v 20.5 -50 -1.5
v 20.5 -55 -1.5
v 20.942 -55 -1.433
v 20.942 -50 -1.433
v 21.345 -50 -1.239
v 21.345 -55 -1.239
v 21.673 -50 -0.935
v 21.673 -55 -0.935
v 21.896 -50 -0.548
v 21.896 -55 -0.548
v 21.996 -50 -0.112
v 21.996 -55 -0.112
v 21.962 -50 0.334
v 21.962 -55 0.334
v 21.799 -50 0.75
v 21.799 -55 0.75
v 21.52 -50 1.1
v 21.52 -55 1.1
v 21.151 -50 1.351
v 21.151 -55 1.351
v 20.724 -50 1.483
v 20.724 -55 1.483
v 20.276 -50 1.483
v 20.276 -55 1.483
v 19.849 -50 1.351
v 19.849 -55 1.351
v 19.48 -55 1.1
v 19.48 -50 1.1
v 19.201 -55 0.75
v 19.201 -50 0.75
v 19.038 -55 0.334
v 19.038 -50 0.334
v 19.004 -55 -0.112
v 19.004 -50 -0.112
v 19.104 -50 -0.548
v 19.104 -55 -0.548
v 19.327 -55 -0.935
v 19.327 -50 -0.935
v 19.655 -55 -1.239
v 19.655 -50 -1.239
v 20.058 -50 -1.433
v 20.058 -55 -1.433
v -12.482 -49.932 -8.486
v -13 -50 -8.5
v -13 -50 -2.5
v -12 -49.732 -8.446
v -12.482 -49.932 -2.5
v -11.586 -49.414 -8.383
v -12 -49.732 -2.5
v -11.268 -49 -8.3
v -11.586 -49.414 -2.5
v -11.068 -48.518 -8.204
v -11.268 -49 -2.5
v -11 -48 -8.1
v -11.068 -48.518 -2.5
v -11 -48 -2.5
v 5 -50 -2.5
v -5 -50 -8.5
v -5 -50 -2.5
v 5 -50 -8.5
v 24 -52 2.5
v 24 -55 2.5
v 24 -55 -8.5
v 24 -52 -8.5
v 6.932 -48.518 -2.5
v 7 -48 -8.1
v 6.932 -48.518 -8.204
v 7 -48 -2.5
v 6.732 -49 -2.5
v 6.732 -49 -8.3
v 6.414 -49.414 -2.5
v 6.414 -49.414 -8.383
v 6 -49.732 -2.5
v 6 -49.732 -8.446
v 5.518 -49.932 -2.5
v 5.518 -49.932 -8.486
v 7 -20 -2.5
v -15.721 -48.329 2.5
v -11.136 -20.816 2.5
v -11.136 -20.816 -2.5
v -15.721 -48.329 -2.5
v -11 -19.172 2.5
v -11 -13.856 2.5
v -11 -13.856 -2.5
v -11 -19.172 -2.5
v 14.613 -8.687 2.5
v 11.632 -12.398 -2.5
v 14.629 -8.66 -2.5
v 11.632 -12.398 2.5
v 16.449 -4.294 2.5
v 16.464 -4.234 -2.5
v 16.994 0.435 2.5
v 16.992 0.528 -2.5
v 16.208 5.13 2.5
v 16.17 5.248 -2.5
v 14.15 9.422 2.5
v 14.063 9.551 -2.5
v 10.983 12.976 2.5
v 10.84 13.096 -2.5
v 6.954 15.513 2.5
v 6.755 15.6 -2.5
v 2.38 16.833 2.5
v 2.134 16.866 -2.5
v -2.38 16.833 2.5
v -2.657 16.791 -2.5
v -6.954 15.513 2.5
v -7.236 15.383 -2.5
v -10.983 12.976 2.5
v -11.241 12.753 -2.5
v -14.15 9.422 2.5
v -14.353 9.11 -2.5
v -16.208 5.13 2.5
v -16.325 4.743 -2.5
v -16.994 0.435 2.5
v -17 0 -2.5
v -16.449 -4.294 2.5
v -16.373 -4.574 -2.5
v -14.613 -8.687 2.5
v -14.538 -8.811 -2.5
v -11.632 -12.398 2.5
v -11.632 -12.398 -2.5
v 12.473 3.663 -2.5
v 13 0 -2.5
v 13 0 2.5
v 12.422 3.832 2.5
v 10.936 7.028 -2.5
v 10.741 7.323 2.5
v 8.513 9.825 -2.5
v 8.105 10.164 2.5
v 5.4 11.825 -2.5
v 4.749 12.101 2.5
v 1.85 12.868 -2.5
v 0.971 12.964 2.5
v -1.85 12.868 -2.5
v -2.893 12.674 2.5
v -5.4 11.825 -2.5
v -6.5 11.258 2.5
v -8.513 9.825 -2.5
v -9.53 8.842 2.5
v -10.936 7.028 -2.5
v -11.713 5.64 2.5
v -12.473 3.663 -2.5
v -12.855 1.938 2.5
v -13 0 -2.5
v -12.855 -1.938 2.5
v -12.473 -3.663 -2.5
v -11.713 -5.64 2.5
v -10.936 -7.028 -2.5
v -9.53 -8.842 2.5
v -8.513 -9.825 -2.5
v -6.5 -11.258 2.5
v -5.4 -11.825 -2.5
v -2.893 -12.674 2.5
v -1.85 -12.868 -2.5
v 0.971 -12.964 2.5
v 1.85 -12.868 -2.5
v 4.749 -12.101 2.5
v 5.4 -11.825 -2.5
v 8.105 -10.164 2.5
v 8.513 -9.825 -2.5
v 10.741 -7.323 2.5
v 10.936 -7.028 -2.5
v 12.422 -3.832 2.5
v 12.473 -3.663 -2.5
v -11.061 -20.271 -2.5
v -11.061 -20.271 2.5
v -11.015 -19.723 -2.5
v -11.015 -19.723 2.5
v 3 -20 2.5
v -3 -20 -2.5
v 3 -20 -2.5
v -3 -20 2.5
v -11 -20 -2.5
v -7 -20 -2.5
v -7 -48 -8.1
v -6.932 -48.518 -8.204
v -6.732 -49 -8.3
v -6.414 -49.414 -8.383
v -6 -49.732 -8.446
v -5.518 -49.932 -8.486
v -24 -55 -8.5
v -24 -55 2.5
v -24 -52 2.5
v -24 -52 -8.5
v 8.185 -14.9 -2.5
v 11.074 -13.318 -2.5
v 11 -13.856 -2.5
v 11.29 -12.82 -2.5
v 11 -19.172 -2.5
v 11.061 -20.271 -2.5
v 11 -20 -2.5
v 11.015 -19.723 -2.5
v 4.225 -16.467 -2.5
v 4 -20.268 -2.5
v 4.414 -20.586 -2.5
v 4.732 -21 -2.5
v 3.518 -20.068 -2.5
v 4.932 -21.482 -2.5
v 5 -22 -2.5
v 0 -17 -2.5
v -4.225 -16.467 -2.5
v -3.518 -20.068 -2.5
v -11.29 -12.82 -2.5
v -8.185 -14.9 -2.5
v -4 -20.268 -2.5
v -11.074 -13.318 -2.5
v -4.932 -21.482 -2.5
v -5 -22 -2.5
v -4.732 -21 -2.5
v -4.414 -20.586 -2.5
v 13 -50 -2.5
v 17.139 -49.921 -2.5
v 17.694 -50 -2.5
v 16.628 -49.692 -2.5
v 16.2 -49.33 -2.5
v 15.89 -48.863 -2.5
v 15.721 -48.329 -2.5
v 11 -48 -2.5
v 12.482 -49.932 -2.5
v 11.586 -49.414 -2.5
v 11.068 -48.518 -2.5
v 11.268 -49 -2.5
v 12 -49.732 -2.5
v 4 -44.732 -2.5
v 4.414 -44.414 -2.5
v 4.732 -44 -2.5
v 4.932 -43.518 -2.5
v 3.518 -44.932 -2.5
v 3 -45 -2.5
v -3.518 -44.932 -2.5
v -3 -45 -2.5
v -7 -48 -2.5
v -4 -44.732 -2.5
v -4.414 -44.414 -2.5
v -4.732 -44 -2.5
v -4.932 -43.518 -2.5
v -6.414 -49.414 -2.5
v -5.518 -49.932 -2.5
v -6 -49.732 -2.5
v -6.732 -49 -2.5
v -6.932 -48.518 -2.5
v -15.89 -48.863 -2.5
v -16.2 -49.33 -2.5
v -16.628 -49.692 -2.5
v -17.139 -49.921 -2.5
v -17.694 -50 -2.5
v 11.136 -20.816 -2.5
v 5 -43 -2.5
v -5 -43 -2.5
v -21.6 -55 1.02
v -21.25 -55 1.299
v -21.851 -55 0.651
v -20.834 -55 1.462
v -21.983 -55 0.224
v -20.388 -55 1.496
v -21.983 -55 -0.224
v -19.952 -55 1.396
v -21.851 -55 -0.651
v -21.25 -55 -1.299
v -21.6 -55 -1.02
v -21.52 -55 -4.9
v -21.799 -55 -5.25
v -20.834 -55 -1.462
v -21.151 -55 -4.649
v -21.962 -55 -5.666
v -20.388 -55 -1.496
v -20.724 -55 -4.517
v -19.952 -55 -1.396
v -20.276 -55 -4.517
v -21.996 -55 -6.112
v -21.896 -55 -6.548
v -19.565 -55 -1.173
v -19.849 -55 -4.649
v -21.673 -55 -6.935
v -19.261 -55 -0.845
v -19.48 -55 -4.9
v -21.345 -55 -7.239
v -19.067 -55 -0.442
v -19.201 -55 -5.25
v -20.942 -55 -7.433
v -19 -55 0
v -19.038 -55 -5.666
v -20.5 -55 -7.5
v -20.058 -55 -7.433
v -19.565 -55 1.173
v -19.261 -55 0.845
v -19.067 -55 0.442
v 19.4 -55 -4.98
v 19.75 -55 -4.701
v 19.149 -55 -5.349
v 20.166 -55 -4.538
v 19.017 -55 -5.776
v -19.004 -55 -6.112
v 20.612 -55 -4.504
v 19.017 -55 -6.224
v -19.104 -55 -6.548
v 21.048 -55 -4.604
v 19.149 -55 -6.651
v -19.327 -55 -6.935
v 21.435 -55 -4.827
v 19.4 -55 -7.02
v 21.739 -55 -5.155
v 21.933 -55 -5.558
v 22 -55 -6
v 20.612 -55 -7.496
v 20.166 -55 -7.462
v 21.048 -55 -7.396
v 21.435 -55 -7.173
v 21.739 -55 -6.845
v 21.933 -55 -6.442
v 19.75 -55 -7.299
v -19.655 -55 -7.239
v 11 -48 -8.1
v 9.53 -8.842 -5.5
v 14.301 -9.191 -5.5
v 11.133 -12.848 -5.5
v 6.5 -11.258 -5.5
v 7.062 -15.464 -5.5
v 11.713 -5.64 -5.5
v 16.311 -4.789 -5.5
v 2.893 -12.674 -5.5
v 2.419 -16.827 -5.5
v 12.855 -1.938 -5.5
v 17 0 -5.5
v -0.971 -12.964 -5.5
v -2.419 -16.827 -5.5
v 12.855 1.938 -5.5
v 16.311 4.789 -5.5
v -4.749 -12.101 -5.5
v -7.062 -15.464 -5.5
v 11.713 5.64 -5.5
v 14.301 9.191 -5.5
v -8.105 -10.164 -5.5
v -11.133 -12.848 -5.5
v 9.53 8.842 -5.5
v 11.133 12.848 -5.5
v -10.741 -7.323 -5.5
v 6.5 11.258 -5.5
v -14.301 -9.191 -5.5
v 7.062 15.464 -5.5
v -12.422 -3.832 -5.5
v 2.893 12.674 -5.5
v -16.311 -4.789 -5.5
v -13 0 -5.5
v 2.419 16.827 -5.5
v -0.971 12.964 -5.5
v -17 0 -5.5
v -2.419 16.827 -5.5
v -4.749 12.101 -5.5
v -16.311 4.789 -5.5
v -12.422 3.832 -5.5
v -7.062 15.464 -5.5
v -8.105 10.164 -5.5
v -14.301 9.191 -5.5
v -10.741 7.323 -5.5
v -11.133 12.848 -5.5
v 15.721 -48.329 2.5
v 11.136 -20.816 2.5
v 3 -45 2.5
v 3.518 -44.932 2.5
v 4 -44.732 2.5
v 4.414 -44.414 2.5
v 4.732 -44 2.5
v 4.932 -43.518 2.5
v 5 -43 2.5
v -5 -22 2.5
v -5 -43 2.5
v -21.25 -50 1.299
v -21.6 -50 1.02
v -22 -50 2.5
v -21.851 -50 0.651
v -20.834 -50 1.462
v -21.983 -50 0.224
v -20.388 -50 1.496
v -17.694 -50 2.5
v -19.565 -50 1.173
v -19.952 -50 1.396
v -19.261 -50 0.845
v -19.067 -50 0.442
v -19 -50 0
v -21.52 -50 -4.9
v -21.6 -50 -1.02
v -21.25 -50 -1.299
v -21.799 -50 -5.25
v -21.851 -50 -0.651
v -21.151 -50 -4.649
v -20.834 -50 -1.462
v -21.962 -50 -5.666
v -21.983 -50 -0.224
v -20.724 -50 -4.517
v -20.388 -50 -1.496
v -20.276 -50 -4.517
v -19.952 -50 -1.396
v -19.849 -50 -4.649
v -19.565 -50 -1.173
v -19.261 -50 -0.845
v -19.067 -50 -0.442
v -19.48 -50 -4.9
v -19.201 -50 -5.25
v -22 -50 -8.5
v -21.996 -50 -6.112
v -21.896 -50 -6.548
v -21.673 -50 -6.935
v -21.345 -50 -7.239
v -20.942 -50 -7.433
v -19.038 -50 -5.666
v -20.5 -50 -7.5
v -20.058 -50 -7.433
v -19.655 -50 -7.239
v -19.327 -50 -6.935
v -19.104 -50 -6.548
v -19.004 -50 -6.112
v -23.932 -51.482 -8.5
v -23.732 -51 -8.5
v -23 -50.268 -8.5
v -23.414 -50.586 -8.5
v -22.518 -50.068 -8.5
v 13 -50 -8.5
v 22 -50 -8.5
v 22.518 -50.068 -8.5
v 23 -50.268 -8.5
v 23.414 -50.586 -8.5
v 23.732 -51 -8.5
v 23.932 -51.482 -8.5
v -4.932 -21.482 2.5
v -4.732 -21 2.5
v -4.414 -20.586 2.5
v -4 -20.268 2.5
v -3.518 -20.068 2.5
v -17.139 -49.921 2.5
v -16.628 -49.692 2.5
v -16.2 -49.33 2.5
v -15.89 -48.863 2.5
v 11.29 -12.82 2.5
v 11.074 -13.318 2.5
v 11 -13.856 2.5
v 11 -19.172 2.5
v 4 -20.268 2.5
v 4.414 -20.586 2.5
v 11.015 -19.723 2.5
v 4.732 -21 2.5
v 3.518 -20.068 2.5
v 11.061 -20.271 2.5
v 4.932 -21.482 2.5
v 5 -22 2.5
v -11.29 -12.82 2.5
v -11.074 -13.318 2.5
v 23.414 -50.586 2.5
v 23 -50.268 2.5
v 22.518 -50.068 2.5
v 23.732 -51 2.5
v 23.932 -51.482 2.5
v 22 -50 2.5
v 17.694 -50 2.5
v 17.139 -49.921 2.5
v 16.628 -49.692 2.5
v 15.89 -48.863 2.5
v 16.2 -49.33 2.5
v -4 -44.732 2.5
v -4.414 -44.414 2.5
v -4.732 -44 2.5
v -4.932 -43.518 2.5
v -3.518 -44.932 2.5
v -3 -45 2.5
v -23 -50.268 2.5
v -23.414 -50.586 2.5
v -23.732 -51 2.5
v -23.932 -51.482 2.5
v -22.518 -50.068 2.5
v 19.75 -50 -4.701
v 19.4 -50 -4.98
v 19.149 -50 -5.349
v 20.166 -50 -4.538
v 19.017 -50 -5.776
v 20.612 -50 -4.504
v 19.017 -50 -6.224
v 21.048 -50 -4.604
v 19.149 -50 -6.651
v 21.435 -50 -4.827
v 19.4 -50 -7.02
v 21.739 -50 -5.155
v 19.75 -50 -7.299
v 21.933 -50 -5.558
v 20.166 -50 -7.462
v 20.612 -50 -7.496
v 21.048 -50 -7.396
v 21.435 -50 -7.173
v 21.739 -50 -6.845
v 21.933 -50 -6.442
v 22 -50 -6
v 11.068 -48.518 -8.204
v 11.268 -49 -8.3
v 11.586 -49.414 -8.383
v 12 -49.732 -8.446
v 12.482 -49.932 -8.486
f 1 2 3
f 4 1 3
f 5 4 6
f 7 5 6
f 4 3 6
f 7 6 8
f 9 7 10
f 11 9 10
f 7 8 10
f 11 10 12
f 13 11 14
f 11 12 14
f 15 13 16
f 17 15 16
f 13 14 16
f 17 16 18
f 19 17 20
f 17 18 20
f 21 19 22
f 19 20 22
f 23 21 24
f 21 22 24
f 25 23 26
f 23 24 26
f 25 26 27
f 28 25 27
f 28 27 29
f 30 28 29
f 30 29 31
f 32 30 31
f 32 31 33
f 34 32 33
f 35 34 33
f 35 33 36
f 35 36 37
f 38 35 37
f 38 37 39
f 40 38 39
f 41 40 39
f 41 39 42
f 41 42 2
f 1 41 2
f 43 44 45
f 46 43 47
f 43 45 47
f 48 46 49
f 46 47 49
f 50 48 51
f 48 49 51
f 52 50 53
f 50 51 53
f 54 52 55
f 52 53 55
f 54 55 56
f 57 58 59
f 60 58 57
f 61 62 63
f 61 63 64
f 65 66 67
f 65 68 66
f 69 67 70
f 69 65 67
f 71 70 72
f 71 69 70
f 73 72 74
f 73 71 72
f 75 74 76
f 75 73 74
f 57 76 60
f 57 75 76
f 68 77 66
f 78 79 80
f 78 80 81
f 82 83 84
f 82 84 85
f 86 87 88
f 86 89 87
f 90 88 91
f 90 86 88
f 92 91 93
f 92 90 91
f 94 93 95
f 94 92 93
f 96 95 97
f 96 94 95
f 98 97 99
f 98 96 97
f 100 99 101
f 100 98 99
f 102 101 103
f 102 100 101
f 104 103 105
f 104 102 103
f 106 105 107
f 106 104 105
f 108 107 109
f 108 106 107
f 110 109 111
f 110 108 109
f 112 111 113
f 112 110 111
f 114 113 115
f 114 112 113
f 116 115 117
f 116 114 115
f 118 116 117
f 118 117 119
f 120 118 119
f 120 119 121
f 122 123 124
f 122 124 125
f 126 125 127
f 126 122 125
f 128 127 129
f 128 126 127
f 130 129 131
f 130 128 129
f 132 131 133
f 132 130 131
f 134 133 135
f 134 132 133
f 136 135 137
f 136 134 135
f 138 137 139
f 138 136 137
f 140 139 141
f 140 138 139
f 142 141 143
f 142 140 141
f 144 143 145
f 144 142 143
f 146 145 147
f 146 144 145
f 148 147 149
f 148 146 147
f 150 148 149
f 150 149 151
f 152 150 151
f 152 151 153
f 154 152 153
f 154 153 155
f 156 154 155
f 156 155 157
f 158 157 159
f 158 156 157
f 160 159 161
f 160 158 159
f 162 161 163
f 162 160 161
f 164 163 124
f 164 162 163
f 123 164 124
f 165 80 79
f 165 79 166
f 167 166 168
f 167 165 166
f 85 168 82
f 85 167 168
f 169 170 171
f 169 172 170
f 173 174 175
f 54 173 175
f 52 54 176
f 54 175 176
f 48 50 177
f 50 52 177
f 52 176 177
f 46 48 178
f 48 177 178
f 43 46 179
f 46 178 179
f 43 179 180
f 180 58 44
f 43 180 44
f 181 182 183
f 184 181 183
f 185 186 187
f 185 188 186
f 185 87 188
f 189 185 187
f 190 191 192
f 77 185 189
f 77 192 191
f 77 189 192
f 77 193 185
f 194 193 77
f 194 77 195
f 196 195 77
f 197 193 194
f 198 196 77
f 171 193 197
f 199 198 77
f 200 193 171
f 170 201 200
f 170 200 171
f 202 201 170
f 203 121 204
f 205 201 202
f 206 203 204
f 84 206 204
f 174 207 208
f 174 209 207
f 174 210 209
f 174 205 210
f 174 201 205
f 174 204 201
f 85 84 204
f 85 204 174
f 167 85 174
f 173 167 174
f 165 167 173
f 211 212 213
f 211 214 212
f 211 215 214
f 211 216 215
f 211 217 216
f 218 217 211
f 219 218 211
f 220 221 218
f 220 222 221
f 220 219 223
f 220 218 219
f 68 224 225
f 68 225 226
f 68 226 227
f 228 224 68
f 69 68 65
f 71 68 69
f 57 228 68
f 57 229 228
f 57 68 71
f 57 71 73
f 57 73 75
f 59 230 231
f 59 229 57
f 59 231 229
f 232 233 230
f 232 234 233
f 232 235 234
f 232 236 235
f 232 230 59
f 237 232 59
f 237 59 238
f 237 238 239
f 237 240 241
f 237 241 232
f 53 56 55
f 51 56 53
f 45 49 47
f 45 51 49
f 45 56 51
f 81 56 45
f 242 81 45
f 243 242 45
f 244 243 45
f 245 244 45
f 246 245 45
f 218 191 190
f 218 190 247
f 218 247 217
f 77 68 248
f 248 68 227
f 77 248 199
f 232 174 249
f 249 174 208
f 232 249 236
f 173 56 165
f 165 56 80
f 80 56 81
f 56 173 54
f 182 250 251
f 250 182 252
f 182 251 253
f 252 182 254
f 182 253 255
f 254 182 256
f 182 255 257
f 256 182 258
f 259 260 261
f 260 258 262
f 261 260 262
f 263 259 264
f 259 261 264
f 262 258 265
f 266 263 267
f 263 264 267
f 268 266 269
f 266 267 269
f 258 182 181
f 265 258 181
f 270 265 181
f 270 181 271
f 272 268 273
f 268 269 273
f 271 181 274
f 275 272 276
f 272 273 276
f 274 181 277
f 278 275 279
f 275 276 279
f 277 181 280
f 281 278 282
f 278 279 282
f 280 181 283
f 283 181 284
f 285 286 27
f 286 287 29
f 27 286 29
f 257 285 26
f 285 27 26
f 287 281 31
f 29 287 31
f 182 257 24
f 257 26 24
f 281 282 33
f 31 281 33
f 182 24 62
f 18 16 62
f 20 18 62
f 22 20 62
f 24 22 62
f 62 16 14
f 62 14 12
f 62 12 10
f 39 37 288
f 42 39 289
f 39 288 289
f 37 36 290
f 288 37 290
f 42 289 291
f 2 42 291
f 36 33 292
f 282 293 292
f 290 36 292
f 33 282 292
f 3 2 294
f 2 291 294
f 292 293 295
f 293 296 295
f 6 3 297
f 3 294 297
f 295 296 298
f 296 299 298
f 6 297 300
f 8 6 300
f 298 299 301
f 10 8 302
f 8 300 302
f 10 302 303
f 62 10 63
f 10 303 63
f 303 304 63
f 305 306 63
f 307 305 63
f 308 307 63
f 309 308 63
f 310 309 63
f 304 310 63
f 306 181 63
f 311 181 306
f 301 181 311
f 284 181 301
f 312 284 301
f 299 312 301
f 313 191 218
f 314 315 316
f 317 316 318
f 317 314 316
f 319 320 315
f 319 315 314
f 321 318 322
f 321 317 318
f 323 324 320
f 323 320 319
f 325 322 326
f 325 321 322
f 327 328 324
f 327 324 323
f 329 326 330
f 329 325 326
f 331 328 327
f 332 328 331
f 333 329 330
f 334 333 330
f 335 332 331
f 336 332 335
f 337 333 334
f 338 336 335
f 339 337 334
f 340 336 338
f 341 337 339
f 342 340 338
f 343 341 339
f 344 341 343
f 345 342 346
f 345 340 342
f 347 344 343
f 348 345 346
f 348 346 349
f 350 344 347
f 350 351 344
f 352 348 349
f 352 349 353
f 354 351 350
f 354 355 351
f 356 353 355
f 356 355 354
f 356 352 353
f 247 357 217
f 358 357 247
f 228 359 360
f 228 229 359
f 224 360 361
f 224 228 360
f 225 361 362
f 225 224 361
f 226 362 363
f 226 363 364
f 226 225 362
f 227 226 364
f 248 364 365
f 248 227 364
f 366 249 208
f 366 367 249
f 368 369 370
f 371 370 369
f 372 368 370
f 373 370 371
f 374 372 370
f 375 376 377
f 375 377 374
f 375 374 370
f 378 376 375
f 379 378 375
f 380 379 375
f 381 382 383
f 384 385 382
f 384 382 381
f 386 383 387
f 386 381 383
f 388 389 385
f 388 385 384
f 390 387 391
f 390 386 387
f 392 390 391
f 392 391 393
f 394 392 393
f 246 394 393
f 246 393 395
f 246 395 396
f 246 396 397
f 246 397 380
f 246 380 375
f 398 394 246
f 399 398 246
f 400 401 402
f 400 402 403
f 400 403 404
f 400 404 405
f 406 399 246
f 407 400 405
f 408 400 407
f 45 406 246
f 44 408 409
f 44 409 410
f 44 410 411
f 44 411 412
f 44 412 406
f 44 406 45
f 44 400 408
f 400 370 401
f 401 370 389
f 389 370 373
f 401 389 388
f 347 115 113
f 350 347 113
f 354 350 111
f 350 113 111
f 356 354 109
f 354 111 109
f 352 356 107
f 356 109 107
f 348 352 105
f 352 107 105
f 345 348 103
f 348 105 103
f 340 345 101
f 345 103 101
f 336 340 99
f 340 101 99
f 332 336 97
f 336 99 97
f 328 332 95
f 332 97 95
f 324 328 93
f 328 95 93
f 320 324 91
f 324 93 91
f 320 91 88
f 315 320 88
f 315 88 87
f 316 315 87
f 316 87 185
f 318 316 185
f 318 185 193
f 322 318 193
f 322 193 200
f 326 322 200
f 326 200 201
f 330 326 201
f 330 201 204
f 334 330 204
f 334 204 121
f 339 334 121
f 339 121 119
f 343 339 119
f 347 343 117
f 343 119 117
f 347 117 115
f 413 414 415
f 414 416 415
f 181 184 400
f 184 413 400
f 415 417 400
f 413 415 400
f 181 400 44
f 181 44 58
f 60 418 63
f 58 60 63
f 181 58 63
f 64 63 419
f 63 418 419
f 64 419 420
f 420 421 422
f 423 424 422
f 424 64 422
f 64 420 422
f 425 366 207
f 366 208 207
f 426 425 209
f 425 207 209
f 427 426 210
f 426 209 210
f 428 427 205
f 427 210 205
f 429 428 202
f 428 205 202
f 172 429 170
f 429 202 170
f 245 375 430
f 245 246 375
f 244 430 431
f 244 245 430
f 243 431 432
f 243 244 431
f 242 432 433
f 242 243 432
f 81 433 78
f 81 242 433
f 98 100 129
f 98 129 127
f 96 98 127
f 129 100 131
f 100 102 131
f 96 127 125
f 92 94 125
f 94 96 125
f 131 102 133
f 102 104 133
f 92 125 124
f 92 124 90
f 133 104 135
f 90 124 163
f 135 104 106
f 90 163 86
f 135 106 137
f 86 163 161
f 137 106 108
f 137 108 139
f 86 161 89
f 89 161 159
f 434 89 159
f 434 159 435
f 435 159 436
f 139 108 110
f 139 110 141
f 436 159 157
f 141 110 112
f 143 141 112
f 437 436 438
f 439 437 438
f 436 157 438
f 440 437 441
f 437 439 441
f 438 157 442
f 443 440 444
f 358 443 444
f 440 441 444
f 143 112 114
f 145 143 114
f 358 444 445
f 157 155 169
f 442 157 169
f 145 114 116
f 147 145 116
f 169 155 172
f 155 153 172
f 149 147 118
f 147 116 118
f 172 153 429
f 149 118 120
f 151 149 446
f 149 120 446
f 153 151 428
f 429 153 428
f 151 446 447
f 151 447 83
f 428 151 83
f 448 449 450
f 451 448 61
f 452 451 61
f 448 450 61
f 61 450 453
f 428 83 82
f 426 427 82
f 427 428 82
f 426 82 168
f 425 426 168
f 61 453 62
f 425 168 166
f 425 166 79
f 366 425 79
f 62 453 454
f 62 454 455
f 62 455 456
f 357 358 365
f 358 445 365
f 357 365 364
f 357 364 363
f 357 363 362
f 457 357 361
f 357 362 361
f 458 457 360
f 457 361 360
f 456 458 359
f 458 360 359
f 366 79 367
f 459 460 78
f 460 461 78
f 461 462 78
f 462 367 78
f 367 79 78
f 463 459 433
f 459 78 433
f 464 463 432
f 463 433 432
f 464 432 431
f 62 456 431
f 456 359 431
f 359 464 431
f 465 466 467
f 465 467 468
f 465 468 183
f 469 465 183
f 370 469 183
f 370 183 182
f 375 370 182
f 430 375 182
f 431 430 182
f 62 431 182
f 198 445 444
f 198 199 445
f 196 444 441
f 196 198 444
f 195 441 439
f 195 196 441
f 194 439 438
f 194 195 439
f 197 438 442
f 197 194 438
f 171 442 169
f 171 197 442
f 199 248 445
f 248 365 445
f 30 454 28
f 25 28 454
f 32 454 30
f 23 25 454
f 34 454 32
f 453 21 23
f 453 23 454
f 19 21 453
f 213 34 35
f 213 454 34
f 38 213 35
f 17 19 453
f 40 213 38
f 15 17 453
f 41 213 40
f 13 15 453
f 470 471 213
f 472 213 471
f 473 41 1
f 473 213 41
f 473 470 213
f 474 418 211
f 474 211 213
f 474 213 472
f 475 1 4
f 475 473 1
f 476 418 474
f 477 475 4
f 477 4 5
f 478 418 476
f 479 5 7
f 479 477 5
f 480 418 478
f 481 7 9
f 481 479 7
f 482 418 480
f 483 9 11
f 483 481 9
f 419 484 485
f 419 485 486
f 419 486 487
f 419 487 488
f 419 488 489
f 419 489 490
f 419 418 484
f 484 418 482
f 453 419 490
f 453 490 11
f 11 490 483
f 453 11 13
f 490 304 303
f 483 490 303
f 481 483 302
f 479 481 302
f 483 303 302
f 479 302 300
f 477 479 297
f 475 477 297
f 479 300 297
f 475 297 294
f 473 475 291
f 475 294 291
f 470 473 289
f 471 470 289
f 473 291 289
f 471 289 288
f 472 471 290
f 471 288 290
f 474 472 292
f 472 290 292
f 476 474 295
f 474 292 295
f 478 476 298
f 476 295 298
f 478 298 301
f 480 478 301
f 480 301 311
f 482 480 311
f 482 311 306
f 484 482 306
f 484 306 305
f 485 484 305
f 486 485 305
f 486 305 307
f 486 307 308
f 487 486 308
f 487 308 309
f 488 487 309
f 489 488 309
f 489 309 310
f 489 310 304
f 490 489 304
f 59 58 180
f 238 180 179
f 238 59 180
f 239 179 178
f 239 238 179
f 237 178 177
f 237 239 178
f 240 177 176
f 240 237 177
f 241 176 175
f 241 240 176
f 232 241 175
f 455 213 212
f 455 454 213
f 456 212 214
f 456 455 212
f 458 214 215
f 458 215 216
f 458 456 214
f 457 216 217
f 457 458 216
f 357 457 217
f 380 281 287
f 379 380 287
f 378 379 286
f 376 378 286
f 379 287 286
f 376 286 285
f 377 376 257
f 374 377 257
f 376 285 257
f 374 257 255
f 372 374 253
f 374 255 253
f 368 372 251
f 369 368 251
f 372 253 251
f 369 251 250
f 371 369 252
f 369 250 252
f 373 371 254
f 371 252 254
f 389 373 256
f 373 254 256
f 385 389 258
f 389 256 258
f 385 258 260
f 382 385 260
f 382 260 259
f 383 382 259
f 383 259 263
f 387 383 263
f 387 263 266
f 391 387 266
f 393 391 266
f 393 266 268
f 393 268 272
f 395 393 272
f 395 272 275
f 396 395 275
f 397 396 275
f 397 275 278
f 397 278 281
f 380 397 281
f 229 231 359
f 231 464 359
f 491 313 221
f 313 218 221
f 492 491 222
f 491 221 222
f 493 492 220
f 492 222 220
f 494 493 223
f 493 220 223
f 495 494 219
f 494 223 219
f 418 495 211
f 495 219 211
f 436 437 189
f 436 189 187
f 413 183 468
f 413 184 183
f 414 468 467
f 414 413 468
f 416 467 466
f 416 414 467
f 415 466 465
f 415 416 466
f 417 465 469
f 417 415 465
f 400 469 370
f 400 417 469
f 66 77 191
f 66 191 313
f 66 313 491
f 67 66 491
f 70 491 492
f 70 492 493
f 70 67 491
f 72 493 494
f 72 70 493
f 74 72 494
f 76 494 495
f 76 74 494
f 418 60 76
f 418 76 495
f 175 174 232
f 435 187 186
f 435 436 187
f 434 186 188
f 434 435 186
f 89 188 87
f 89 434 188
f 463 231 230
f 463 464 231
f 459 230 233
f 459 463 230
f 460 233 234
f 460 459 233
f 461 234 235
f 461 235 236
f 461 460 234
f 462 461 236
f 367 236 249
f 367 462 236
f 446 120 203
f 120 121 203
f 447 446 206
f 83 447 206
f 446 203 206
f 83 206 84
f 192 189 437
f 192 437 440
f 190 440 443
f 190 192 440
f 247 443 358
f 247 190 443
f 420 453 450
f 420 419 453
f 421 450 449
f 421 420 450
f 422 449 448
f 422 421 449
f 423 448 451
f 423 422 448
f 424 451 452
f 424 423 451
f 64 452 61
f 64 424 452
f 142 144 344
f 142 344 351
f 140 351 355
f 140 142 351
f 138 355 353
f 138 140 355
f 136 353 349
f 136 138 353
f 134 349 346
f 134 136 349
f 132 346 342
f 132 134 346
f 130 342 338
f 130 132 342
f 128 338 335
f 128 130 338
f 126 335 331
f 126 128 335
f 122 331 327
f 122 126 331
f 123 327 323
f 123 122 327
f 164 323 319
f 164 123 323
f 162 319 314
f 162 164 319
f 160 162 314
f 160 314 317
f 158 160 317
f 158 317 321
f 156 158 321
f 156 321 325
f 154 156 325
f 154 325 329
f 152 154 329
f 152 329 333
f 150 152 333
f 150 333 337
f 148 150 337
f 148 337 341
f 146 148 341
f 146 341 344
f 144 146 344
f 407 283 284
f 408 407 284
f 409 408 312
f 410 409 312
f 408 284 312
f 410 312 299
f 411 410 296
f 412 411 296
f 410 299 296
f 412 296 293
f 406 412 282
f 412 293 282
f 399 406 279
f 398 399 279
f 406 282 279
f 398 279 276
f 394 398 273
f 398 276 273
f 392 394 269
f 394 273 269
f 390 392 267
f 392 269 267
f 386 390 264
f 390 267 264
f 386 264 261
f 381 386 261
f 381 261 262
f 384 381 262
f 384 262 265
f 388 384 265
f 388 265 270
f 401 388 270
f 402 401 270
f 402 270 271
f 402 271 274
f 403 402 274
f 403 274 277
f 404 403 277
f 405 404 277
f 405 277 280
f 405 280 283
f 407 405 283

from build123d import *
from build123d.topology import SkipClean

# Parameters (mm, degrees)
SKETCH_1_R           = 13
SKETCH_1_W           = 10
SKETCH_1_H           = 25
EXTRUDE_1_DEPTH      = 2.5
EXTRUDE_2_DEPTH      = 2.5
EXTRUDE_2_DEPTH_BACK = 8.5
SKETCH_8_W           = 48
SKETCH_8_H           = 5
CUT_EXTRUDE_1_REACH  = 78.369
SKETCH_9_R           = 1.5
RIB_3_REACH          = 67.744
SKETCH_11_WALL_W     = 164.081759086
SKETCH_11_WALL_H     = 4
FILLET_1_R           = 2
FILLET_2_R           = 2
FILLET_3_R           = 10
SKETCH_12_R          = 17
SKETCH_12_R_2        = 13
EXTRUDE_3_DEPTH      = 3


# Some blends are built 0.0001 mm under size
with BuildPart() as part:
    # 草图1 → 凸台-拉伸1 (new, symmetric)
    with BuildSketch(Plane.XY):
        with BuildLine():
            Line((-24, -55), (24, -55))
            Line((24, -55), (24, -50))
            Line((24, -50), (16, -50))
            Line((16, -50), (11, -20))
            Line((11, -20), (11, -12.961481397))
            ThreePointArc((11, -12.961481397), (0, 17), (-11, -12.961481397))
            Line((-11, -12.961481397), (-11, -20))
            Line((-11, -20), (-16, -50))
            Line((-16, -50), (-24, -50))
            Line((-24, -50), (-24, -55))
        make_face()
        Circle(SKETCH_1_R, mode=Mode.SUBTRACT)
        with Locations((0, -32.5)):
            Rectangle(SKETCH_1_W, SKETCH_1_H, mode=Mode.SUBTRACT)
    extrude(amount=EXTRUDE_1_DEPTH, both=True)

    # 草图8 → 凸台-拉伸2 (add, two sides: drawn at the far end of the back side and taken through both)
    with BuildSketch(Plane.XY.offset(-EXTRUDE_2_DEPTH_BACK)):
        with Locations((0, -52.5)):
            Rectangle(SKETCH_8_W, SKETCH_8_H)
    extrude(amount=EXTRUDE_2_DEPTH + EXTRUDE_2_DEPTH_BACK)

    # 草图9 → 切除-拉伸1 (cut, up to next)
    with BuildSketch(Plane.XZ.offset(55), mode=Mode.PRIVATE) as cut_extrude_1_sk1:
        with Locations((-20.5, 0)):
            Circle(SKETCH_9_R)
    cut_extrude_1_tool1 = extrude(cut_extrude_1_sk1.sketch, amount=-CUT_EXTRUDE_1_REACH, mode=Mode.PRIVATE) & part.part
    # 草图9 → 切除-拉伸1 (cut, up to next)
    with BuildSketch(Plane.XZ.offset(55), mode=Mode.PRIVATE) as cut_extrude_1_sk2:
        with Locations(Location((20.5, 0, 0), (0, 0, 270))):
            Circle(SKETCH_9_R)
    cut_extrude_1_tool2 = extrude(cut_extrude_1_sk2.sketch, amount=-CUT_EXTRUDE_1_REACH, mode=Mode.PRIVATE) & part.part
    # 草图9 → 切除-拉伸1 (cut, up to next)
    with BuildSketch(Plane.XZ.offset(55), mode=Mode.PRIVATE) as cut_extrude_1_sk3:
        with Locations(Location((-20.5, -6, 0), (0, 0, 270))):
            Circle(SKETCH_9_R)
    cut_extrude_1_tool3 = extrude(cut_extrude_1_sk3.sketch, amount=-CUT_EXTRUDE_1_REACH, mode=Mode.PRIVATE) & part.part
    # 草图9 → 切除-拉伸1 (cut, up to next)
    with BuildSketch(Plane.XZ.offset(55), mode=Mode.PRIVATE) as cut_extrude_1_sk4:
        with Locations((20.5, -6)):
            Circle(SKETCH_9_R)
    cut_extrude_1_tool4 = extrude(cut_extrude_1_sk4.sketch, amount=-CUT_EXTRUDE_1_REACH, mode=Mode.PRIVATE) & part.part
    add(cut_extrude_1_tool1.solids().sort_by_distance((-20.5, -55, 0))[0], mode=Mode.SUBTRACT)
    add(cut_extrude_1_tool2.solids().sort_by_distance((20.5, -55, 0))[0], mode=Mode.SUBTRACT)
    add(cut_extrude_1_tool3.solids().sort_by_distance((-20.5, -55, -6))[0], mode=Mode.SUBTRACT)
    add(cut_extrude_1_tool4.solids().sort_by_distance((20.5, -55, -6))[0], mode=Mode.SUBTRACT)

    # 草图11 wall → 筋3 (add, up to next)
    with BuildSketch(Plane(origin=(-11, -35, -5.5), x_dir=(0, -0.980580675691, -0.196116135138), z_dir=(0, -0.196116135138, 0.980580675691)), mode=Mode.PRIVATE) as rib_3_sk1:
        with Locations((0, 2)):
            Rectangle(SKETCH_11_WALL_W, SKETCH_11_WALL_H)
    rib_3_tool1 = extrude(rib_3_sk1.sketch, amount=RIB_3_REACH, mode=Mode.PRIVATE) - part.part
    rib_3 = rib_3_tool1.solids().sort_by_distance((-11, -35, -5.5))[0]
    add(rib_3)

    # 镜向1: 筋3 across plane
    add(rib_3.mirror(Plane(origin=(0, 0, 0), x_dir=(0, 0, 1), z_dir=(1, 0, 0))))

    # 圆角1
    fillet_1_edges = [part.edges().sort_by_distance(p)[0] for p in [
        (11, -50, -5.5),
        (7, -50, -5.5),
        (-24, -50, -3),
        (-16, -50, 0),
        (16, -50, 0),
        (24, -50, -3),
        (5, -45, 0),
        (5, -20, 0),
        (-5, -20, 0),
        (-5, -45, 0),
        (-11, -50, -5.5),
        (-7, -50, -5.5),
    ]]
    fillet(fillet_1_edges, radius=FILLET_1_R - 0.0001)  # a hair under: the kernel refuses the full size

    # 圆角2
    fillet_2_edges = [part.edges().sort_by_distance(p)[0] for p in [
        (-11, -12.961481397, 0),
        (11, -12.961481397, 0),
    ]]
    fillet(fillet_2_edges, radius=FILLET_2_R)

    # 圆角3
    # the kernel refuses this fillet: 10 mm, written as the material it adds along each edge
    with BuildSketch(Plane(origin=(-11, -20, -2.5), x_dir=(0, 1, 0), z_dir=(0, 0, 1))) as fillet_3_piece_1:
        with BuildLine():
            CenterArc((FILLET_3_R * 0.0827625302982, FILLET_3_R), FILLET_3_R, 260.537677792, 9.462322208)
            Line((-FILLET_3_R * 0.0816364570071, FILLET_3_R * 0.0136060761679), (0, 0))
            Line((0, 0), (FILLET_3_R * 0.0827625302982, 0))
        make_face()
    extrude(amount=5)
    with BuildSketch(Plane(origin=(11, -20, -2.5), x_dir=(0, 1, 0), z_dir=(0, 0, 1))) as fillet_3_piece_2:
        with BuildLine():
            CenterArc((FILLET_3_R * 0.0827625302982, -FILLET_3_R), FILLET_3_R, 90, 9.462322208)
            Line((-FILLET_3_R * 0.0816364570071, -FILLET_3_R * 0.0136060761679), (0, 0))
            Line((0, 0), (FILLET_3_R * 0.0827625302982, 0))
        make_face()
    extrude(amount=5)

    # 草图12 → 凸台-拉伸3 (add)
    with SkipClean():  # the faces are left unmerged after this step: merging them gives an invalid solid
        with BuildSketch(Plane(origin=(0, 0, -2.5), x_dir=(-1, 0, 0), z_dir=(0, 0, -1))):
            Circle(SKETCH_12_R)
            Circle(SKETCH_12_R_2, mode=Mode.SUBTRACT)
        extrude(amount=EXTRUDE_3_DEPTH)


solid = part.part
